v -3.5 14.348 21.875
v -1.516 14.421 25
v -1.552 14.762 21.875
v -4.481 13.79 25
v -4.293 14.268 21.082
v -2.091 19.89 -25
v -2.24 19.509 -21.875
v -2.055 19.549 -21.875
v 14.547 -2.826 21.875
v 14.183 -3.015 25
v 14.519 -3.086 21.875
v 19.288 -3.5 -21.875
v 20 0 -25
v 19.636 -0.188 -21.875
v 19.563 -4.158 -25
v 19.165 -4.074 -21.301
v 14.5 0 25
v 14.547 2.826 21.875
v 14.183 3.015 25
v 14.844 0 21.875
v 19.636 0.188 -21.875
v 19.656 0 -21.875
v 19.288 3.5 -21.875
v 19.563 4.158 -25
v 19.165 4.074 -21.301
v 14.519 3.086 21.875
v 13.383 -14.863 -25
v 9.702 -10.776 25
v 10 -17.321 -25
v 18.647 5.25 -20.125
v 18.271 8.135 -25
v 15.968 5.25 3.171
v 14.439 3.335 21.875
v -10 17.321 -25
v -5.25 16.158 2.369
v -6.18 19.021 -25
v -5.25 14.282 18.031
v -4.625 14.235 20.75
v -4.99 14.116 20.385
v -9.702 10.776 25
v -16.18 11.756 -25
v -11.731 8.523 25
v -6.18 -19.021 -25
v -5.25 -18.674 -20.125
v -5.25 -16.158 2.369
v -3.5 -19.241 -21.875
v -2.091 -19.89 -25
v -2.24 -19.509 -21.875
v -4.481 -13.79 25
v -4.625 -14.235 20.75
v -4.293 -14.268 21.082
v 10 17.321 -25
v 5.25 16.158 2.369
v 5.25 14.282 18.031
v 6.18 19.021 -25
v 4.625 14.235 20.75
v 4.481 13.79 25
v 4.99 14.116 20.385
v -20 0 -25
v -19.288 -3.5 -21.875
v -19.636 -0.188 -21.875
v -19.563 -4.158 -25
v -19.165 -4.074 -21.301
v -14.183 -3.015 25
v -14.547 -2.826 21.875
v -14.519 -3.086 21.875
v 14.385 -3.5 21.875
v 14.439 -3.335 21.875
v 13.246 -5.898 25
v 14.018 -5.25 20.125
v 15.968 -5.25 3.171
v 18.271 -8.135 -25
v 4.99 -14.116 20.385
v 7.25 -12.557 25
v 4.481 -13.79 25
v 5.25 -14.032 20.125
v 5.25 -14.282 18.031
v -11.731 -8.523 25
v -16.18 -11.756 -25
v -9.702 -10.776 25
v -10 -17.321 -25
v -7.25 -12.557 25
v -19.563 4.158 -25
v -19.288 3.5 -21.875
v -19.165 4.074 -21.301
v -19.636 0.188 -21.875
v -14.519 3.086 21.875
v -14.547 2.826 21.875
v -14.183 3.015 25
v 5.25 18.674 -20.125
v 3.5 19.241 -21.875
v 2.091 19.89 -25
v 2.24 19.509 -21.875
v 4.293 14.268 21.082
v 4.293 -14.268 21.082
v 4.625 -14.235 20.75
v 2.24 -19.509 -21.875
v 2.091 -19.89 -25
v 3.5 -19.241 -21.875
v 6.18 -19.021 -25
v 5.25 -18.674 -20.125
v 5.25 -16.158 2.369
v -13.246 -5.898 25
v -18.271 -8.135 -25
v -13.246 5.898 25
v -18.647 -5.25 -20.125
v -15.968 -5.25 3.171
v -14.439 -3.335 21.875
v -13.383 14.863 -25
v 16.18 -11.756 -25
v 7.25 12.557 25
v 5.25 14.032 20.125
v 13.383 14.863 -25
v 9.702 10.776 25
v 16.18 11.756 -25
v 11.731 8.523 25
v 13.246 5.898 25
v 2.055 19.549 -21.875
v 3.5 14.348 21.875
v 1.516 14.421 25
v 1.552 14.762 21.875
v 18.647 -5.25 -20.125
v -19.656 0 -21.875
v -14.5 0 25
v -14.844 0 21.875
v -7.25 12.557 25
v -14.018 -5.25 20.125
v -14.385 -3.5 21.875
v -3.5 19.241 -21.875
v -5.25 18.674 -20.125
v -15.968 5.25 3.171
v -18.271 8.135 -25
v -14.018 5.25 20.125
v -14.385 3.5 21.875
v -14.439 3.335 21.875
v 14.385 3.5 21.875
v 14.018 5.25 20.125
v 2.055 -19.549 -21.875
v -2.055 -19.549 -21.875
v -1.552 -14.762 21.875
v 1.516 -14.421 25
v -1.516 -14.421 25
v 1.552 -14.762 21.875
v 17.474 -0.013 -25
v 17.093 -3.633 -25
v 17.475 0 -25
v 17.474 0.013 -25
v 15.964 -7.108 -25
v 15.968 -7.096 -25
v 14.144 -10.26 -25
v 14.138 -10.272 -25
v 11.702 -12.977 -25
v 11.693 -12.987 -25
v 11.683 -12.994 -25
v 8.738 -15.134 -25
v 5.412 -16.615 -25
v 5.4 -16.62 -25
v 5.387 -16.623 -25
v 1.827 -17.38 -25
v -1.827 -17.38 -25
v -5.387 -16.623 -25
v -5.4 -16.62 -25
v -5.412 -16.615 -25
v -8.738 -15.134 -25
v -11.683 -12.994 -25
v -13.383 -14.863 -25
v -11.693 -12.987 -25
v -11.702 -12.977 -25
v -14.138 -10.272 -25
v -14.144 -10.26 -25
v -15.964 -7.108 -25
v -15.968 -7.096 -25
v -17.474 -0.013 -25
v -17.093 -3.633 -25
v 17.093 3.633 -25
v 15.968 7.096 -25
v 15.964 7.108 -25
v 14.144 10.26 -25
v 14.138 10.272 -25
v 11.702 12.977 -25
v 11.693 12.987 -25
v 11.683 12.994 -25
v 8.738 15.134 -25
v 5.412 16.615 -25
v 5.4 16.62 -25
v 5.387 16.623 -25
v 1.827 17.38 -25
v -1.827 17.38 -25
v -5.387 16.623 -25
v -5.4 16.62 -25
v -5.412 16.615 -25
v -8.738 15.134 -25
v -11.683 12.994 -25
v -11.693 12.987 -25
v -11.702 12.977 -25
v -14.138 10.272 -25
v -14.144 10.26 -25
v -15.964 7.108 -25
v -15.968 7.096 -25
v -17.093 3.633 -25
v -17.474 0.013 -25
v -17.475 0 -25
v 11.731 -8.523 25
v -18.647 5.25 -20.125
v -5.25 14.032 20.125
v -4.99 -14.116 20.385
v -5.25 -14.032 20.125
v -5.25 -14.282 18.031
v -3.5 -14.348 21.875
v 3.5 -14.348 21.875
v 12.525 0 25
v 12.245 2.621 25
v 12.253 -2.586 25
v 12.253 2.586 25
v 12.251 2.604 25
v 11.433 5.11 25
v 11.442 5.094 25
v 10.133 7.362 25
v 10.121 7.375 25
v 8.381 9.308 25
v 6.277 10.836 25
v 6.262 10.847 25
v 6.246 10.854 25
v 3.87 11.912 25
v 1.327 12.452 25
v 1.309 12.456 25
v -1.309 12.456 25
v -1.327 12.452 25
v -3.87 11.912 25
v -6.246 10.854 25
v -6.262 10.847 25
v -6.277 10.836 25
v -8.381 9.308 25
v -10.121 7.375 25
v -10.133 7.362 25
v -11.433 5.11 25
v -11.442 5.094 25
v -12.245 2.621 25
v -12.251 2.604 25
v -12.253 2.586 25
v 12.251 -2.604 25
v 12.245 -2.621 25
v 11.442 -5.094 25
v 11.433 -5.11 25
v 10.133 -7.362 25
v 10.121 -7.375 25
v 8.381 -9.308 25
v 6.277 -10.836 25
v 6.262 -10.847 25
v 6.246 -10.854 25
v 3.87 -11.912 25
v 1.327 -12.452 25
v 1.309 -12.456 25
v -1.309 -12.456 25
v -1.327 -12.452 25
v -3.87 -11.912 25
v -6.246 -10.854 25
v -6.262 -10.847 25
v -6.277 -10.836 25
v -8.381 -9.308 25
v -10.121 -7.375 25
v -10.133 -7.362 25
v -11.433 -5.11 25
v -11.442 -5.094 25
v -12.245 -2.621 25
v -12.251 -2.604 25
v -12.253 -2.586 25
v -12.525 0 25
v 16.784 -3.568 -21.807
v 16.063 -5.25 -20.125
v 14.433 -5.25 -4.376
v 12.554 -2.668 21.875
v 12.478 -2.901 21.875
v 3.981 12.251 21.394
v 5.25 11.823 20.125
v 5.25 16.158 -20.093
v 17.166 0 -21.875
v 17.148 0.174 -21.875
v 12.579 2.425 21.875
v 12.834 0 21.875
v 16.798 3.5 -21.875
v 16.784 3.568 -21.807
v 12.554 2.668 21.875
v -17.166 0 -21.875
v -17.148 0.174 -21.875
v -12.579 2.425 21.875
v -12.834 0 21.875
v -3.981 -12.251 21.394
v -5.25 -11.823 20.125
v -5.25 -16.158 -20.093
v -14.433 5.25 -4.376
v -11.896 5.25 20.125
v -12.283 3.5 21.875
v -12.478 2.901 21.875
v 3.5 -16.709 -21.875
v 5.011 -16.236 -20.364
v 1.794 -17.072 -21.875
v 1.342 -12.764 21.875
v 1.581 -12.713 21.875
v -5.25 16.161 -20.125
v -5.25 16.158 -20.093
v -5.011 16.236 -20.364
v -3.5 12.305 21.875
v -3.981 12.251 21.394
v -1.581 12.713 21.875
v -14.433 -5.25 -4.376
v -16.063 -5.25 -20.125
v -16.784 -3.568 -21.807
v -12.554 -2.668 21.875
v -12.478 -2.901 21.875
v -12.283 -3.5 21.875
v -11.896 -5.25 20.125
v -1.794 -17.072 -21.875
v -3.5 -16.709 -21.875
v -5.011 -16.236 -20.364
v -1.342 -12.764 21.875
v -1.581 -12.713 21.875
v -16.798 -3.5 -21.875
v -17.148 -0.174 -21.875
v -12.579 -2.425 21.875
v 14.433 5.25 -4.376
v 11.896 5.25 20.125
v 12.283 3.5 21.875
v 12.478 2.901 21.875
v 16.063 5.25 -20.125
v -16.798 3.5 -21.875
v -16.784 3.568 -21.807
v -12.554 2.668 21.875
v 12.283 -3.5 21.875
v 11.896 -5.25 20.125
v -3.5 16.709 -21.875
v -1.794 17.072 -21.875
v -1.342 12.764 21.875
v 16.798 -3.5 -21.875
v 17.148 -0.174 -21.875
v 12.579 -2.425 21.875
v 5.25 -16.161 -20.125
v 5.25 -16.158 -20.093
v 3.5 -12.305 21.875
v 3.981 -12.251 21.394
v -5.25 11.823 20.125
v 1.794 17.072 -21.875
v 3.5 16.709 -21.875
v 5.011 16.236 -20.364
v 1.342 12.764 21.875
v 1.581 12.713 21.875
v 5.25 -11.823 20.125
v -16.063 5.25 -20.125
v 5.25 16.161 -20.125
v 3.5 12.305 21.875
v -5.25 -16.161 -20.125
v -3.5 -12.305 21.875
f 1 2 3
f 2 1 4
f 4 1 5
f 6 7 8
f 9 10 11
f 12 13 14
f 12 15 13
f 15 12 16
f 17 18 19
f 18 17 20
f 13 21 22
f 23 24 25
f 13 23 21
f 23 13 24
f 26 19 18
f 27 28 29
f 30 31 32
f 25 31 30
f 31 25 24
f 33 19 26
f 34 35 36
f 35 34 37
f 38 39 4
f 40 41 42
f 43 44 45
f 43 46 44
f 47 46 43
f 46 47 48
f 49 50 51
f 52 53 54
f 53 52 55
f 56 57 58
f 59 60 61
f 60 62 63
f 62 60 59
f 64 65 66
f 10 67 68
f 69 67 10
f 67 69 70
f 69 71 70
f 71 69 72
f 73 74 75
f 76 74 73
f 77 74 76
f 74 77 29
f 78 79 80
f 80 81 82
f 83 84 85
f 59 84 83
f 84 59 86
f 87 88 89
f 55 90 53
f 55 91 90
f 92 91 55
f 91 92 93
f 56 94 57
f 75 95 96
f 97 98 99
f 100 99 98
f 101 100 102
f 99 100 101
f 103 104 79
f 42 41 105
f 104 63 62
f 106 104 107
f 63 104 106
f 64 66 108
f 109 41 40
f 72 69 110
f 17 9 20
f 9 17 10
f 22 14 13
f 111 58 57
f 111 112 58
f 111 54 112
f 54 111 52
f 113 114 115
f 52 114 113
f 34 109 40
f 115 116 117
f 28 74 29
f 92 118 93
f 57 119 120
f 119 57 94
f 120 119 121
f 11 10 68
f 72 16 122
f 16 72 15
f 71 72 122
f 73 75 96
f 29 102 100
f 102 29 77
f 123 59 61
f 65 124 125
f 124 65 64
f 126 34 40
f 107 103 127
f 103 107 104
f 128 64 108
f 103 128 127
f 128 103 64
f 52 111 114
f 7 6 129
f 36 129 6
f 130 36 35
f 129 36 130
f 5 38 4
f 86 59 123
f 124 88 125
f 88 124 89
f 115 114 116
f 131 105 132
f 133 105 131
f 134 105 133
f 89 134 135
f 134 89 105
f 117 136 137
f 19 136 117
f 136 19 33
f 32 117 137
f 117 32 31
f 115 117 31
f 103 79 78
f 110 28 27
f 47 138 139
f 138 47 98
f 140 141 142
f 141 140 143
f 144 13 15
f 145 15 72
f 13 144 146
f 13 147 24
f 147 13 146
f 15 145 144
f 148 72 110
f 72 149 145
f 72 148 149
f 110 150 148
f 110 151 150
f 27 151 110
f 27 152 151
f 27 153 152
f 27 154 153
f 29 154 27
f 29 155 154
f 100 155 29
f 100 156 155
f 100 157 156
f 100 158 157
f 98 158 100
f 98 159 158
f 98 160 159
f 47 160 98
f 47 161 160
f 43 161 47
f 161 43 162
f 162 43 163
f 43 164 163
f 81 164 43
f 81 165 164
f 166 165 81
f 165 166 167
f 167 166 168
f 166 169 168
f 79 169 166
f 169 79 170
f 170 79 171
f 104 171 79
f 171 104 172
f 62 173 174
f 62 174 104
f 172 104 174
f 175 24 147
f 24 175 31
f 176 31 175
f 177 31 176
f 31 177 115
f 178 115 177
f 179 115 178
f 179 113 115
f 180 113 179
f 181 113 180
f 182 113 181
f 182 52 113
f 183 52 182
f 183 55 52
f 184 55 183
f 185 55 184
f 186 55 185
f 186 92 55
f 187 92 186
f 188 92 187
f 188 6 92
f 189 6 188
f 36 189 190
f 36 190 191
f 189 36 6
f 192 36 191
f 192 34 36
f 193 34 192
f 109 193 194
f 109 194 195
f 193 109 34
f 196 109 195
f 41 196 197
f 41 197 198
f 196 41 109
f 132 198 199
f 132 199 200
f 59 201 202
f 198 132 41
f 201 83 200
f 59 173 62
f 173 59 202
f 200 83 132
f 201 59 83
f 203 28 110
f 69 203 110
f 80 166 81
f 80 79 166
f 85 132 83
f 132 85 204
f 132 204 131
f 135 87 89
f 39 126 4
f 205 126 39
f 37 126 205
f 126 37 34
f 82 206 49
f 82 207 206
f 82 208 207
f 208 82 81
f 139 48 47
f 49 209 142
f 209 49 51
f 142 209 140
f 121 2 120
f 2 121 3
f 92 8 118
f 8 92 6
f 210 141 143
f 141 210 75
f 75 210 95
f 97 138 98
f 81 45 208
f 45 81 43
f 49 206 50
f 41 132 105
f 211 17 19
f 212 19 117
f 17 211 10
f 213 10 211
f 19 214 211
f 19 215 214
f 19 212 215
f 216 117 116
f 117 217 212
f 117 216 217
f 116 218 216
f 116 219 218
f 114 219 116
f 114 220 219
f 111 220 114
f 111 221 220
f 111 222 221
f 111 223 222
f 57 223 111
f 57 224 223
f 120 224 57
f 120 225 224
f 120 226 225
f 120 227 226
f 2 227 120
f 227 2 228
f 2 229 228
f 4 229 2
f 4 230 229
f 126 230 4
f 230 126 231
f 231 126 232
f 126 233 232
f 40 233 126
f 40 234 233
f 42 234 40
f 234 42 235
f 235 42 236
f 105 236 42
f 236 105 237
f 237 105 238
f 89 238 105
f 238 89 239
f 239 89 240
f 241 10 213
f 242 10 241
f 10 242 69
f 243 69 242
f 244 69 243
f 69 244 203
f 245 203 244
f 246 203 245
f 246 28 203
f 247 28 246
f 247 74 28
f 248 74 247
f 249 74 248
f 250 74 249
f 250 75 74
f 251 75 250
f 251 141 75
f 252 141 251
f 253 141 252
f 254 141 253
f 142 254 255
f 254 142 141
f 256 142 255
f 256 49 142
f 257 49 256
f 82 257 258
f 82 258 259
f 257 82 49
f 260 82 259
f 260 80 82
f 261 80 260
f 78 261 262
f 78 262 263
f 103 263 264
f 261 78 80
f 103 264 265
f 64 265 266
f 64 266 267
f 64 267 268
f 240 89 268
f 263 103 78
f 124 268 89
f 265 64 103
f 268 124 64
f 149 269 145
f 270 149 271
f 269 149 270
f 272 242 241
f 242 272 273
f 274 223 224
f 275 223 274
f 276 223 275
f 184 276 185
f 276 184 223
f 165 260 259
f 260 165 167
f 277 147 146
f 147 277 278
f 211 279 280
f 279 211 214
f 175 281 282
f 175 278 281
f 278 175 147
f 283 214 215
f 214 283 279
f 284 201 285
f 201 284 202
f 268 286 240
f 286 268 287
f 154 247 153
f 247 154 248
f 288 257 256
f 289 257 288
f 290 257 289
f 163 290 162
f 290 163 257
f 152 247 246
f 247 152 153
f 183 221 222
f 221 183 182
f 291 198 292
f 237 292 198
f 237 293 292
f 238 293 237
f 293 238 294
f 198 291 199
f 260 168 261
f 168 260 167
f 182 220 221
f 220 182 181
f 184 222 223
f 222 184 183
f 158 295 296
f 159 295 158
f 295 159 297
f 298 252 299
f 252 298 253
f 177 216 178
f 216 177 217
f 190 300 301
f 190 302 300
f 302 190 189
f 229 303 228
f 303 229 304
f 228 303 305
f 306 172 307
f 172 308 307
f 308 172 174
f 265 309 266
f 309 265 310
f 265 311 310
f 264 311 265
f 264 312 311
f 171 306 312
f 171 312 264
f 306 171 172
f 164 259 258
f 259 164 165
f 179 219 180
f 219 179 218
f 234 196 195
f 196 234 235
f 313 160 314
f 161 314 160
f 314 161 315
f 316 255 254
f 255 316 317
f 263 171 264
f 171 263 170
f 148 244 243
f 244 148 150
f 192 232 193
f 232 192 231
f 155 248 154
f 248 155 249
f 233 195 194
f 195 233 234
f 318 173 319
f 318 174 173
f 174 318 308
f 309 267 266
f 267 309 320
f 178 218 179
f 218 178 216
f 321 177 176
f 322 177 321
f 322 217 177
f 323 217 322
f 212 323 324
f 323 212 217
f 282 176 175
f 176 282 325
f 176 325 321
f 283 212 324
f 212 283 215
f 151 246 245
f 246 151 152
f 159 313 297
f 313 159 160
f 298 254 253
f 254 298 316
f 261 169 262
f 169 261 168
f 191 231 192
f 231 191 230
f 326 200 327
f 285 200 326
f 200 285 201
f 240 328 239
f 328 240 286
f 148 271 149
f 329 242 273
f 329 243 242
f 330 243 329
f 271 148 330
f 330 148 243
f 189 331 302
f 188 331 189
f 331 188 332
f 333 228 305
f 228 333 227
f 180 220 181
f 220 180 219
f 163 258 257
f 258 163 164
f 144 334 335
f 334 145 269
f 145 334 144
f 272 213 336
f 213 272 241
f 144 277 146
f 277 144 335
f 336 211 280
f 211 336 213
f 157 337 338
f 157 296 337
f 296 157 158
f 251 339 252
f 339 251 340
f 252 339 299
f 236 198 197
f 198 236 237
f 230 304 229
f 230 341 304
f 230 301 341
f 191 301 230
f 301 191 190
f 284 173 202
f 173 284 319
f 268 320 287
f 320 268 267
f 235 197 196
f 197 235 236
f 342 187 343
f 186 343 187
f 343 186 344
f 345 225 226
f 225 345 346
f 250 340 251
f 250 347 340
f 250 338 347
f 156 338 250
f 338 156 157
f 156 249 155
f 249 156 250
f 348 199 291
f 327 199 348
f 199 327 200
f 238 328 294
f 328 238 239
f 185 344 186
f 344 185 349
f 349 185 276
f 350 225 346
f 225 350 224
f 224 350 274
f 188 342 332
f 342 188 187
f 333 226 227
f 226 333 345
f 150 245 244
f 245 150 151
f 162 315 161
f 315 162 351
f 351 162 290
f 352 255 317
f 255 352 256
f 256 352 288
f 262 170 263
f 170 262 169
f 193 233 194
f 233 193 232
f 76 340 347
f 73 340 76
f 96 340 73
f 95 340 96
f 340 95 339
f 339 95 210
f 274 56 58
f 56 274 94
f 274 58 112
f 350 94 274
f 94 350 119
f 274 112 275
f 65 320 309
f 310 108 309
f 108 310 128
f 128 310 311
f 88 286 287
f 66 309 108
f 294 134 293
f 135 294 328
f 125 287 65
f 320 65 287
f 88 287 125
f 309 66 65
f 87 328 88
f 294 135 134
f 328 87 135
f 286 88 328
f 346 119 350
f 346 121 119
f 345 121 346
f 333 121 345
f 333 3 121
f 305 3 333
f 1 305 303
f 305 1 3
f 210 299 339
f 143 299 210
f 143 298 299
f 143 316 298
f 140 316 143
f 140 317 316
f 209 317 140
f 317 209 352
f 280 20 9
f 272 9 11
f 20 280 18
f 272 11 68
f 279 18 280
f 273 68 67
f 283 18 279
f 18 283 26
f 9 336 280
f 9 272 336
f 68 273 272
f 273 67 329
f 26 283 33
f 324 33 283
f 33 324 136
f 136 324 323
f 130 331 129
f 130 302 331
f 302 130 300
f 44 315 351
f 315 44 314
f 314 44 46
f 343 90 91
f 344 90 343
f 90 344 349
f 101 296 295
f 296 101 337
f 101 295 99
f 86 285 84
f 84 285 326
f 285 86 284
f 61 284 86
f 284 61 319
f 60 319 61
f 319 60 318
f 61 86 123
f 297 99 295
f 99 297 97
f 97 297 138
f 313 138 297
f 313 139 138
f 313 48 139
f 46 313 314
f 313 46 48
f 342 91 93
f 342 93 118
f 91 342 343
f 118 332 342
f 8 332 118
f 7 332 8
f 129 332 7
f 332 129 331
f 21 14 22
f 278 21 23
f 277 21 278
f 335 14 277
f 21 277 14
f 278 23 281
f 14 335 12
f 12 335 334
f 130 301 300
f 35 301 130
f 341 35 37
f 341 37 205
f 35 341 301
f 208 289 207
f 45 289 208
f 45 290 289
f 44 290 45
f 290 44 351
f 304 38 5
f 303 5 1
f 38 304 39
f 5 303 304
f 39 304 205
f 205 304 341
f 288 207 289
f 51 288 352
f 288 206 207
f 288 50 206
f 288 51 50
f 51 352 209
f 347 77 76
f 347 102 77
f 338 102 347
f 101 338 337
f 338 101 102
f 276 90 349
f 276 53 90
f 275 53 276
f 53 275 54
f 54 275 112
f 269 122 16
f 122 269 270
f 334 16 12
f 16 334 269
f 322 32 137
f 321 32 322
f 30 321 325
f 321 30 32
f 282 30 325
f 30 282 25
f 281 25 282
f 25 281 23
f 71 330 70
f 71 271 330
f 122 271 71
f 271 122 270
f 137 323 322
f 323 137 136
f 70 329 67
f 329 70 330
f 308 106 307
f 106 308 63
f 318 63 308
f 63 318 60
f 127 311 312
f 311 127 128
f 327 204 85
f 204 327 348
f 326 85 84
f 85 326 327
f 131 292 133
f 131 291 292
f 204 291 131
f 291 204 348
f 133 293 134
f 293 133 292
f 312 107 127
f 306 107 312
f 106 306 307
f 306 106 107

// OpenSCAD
// To my college friends back home, the first to hopefuly many
// openSCAD designs to better aid our fellow men and women


// ~~~~~~~~~~~~~~~~~~~~~~~~~~~~~~~~~~~~~~~~~~~~~~~~~~//
// OVERALL STAND DIMENSIONS // 
// Overall Height of Stand
height = 50;
// This is the overall height of the stand
// to find out how high you need to make your stand
// measure the distance from where you want your bowl
// to be resting on from the ground
// then measure the diameter of the bowl at that point
// and enter that value into the diameter value
// Top diameter of stand
top_diameter = 25;
// this is where you enter the value from the previous step

// Bottom diameter of stand
base_diameter = 35;
// this is just an eyeballed value, a wider base is more stable
// but will take more time to print beause of more material and
// more support material

// Offset thickness of top ring
topring_offset = 2;
// this is the offeset for the generating the outside diameter of
// the top and bottom rings
// any positive value will work
// Offset thickness of bottom ring
botring_offset = 2.5;
// I'd recommend at least 2 for topring_offset and 2.5 or more for botring_offset



//~~~~~~~~~~~~~~~~~~~~~~~~~~~~~~~~~~~~~~~~~~~~~~~~~~~~//
// RECTANGULAR CUTS DIMENSIONS //
// Spacing from cuts to the ends
end_thickness = 8;
// this will determine how tall your rectangular cuts are compared the 
// the height
// How many cuts
cuts = 4;
// this is how many cuts you will have on your stand
// how wide the cuts are
cut_width = 7;
// this is how wide your rectangular cuts will be on the stand
// too big and your stand will have no supporting beams
// Turn fillets on/off
fillet = "true"; //[false,true]
// set to true if you want fillets on the corners of the
// bowl stand cuts



top_radius = top_diameter/2;
base_radius = base_diameter/2;

module bowlStand2() {
    difference() {
        difference() {
            cylinder(h = height, r1 = base_radius+botring_offset, r2 = top_radius+topring_offset, center = true);
            scale([1,1,1.01])
            cylinder(h = height, r1 = base_radius, r2 = top_radius, center = true);
        }
        
        union() {
            for (i = [0:cuts]) {
                rotate([0,0,i*360/cuts]) 
                RoundedSquareCut();
            }
        }
    }
}

module RoundedSquareCut() {
    cut_height = (height - (end_thickness + cut_width/4));
    rotate([90,0,0]) 
    linear_extrude((base_radius+top_radius)*2)
        
    if (fillet == "true") {
        offset(cut_width/4)
        // translate([0,0,0]) 
        square([cut_width,cut_height], center = true);
    } else {
        // translate([0,0,0]) 
        square([cut_width,cut_height], center = true);
    }
}

bowlStand2();
